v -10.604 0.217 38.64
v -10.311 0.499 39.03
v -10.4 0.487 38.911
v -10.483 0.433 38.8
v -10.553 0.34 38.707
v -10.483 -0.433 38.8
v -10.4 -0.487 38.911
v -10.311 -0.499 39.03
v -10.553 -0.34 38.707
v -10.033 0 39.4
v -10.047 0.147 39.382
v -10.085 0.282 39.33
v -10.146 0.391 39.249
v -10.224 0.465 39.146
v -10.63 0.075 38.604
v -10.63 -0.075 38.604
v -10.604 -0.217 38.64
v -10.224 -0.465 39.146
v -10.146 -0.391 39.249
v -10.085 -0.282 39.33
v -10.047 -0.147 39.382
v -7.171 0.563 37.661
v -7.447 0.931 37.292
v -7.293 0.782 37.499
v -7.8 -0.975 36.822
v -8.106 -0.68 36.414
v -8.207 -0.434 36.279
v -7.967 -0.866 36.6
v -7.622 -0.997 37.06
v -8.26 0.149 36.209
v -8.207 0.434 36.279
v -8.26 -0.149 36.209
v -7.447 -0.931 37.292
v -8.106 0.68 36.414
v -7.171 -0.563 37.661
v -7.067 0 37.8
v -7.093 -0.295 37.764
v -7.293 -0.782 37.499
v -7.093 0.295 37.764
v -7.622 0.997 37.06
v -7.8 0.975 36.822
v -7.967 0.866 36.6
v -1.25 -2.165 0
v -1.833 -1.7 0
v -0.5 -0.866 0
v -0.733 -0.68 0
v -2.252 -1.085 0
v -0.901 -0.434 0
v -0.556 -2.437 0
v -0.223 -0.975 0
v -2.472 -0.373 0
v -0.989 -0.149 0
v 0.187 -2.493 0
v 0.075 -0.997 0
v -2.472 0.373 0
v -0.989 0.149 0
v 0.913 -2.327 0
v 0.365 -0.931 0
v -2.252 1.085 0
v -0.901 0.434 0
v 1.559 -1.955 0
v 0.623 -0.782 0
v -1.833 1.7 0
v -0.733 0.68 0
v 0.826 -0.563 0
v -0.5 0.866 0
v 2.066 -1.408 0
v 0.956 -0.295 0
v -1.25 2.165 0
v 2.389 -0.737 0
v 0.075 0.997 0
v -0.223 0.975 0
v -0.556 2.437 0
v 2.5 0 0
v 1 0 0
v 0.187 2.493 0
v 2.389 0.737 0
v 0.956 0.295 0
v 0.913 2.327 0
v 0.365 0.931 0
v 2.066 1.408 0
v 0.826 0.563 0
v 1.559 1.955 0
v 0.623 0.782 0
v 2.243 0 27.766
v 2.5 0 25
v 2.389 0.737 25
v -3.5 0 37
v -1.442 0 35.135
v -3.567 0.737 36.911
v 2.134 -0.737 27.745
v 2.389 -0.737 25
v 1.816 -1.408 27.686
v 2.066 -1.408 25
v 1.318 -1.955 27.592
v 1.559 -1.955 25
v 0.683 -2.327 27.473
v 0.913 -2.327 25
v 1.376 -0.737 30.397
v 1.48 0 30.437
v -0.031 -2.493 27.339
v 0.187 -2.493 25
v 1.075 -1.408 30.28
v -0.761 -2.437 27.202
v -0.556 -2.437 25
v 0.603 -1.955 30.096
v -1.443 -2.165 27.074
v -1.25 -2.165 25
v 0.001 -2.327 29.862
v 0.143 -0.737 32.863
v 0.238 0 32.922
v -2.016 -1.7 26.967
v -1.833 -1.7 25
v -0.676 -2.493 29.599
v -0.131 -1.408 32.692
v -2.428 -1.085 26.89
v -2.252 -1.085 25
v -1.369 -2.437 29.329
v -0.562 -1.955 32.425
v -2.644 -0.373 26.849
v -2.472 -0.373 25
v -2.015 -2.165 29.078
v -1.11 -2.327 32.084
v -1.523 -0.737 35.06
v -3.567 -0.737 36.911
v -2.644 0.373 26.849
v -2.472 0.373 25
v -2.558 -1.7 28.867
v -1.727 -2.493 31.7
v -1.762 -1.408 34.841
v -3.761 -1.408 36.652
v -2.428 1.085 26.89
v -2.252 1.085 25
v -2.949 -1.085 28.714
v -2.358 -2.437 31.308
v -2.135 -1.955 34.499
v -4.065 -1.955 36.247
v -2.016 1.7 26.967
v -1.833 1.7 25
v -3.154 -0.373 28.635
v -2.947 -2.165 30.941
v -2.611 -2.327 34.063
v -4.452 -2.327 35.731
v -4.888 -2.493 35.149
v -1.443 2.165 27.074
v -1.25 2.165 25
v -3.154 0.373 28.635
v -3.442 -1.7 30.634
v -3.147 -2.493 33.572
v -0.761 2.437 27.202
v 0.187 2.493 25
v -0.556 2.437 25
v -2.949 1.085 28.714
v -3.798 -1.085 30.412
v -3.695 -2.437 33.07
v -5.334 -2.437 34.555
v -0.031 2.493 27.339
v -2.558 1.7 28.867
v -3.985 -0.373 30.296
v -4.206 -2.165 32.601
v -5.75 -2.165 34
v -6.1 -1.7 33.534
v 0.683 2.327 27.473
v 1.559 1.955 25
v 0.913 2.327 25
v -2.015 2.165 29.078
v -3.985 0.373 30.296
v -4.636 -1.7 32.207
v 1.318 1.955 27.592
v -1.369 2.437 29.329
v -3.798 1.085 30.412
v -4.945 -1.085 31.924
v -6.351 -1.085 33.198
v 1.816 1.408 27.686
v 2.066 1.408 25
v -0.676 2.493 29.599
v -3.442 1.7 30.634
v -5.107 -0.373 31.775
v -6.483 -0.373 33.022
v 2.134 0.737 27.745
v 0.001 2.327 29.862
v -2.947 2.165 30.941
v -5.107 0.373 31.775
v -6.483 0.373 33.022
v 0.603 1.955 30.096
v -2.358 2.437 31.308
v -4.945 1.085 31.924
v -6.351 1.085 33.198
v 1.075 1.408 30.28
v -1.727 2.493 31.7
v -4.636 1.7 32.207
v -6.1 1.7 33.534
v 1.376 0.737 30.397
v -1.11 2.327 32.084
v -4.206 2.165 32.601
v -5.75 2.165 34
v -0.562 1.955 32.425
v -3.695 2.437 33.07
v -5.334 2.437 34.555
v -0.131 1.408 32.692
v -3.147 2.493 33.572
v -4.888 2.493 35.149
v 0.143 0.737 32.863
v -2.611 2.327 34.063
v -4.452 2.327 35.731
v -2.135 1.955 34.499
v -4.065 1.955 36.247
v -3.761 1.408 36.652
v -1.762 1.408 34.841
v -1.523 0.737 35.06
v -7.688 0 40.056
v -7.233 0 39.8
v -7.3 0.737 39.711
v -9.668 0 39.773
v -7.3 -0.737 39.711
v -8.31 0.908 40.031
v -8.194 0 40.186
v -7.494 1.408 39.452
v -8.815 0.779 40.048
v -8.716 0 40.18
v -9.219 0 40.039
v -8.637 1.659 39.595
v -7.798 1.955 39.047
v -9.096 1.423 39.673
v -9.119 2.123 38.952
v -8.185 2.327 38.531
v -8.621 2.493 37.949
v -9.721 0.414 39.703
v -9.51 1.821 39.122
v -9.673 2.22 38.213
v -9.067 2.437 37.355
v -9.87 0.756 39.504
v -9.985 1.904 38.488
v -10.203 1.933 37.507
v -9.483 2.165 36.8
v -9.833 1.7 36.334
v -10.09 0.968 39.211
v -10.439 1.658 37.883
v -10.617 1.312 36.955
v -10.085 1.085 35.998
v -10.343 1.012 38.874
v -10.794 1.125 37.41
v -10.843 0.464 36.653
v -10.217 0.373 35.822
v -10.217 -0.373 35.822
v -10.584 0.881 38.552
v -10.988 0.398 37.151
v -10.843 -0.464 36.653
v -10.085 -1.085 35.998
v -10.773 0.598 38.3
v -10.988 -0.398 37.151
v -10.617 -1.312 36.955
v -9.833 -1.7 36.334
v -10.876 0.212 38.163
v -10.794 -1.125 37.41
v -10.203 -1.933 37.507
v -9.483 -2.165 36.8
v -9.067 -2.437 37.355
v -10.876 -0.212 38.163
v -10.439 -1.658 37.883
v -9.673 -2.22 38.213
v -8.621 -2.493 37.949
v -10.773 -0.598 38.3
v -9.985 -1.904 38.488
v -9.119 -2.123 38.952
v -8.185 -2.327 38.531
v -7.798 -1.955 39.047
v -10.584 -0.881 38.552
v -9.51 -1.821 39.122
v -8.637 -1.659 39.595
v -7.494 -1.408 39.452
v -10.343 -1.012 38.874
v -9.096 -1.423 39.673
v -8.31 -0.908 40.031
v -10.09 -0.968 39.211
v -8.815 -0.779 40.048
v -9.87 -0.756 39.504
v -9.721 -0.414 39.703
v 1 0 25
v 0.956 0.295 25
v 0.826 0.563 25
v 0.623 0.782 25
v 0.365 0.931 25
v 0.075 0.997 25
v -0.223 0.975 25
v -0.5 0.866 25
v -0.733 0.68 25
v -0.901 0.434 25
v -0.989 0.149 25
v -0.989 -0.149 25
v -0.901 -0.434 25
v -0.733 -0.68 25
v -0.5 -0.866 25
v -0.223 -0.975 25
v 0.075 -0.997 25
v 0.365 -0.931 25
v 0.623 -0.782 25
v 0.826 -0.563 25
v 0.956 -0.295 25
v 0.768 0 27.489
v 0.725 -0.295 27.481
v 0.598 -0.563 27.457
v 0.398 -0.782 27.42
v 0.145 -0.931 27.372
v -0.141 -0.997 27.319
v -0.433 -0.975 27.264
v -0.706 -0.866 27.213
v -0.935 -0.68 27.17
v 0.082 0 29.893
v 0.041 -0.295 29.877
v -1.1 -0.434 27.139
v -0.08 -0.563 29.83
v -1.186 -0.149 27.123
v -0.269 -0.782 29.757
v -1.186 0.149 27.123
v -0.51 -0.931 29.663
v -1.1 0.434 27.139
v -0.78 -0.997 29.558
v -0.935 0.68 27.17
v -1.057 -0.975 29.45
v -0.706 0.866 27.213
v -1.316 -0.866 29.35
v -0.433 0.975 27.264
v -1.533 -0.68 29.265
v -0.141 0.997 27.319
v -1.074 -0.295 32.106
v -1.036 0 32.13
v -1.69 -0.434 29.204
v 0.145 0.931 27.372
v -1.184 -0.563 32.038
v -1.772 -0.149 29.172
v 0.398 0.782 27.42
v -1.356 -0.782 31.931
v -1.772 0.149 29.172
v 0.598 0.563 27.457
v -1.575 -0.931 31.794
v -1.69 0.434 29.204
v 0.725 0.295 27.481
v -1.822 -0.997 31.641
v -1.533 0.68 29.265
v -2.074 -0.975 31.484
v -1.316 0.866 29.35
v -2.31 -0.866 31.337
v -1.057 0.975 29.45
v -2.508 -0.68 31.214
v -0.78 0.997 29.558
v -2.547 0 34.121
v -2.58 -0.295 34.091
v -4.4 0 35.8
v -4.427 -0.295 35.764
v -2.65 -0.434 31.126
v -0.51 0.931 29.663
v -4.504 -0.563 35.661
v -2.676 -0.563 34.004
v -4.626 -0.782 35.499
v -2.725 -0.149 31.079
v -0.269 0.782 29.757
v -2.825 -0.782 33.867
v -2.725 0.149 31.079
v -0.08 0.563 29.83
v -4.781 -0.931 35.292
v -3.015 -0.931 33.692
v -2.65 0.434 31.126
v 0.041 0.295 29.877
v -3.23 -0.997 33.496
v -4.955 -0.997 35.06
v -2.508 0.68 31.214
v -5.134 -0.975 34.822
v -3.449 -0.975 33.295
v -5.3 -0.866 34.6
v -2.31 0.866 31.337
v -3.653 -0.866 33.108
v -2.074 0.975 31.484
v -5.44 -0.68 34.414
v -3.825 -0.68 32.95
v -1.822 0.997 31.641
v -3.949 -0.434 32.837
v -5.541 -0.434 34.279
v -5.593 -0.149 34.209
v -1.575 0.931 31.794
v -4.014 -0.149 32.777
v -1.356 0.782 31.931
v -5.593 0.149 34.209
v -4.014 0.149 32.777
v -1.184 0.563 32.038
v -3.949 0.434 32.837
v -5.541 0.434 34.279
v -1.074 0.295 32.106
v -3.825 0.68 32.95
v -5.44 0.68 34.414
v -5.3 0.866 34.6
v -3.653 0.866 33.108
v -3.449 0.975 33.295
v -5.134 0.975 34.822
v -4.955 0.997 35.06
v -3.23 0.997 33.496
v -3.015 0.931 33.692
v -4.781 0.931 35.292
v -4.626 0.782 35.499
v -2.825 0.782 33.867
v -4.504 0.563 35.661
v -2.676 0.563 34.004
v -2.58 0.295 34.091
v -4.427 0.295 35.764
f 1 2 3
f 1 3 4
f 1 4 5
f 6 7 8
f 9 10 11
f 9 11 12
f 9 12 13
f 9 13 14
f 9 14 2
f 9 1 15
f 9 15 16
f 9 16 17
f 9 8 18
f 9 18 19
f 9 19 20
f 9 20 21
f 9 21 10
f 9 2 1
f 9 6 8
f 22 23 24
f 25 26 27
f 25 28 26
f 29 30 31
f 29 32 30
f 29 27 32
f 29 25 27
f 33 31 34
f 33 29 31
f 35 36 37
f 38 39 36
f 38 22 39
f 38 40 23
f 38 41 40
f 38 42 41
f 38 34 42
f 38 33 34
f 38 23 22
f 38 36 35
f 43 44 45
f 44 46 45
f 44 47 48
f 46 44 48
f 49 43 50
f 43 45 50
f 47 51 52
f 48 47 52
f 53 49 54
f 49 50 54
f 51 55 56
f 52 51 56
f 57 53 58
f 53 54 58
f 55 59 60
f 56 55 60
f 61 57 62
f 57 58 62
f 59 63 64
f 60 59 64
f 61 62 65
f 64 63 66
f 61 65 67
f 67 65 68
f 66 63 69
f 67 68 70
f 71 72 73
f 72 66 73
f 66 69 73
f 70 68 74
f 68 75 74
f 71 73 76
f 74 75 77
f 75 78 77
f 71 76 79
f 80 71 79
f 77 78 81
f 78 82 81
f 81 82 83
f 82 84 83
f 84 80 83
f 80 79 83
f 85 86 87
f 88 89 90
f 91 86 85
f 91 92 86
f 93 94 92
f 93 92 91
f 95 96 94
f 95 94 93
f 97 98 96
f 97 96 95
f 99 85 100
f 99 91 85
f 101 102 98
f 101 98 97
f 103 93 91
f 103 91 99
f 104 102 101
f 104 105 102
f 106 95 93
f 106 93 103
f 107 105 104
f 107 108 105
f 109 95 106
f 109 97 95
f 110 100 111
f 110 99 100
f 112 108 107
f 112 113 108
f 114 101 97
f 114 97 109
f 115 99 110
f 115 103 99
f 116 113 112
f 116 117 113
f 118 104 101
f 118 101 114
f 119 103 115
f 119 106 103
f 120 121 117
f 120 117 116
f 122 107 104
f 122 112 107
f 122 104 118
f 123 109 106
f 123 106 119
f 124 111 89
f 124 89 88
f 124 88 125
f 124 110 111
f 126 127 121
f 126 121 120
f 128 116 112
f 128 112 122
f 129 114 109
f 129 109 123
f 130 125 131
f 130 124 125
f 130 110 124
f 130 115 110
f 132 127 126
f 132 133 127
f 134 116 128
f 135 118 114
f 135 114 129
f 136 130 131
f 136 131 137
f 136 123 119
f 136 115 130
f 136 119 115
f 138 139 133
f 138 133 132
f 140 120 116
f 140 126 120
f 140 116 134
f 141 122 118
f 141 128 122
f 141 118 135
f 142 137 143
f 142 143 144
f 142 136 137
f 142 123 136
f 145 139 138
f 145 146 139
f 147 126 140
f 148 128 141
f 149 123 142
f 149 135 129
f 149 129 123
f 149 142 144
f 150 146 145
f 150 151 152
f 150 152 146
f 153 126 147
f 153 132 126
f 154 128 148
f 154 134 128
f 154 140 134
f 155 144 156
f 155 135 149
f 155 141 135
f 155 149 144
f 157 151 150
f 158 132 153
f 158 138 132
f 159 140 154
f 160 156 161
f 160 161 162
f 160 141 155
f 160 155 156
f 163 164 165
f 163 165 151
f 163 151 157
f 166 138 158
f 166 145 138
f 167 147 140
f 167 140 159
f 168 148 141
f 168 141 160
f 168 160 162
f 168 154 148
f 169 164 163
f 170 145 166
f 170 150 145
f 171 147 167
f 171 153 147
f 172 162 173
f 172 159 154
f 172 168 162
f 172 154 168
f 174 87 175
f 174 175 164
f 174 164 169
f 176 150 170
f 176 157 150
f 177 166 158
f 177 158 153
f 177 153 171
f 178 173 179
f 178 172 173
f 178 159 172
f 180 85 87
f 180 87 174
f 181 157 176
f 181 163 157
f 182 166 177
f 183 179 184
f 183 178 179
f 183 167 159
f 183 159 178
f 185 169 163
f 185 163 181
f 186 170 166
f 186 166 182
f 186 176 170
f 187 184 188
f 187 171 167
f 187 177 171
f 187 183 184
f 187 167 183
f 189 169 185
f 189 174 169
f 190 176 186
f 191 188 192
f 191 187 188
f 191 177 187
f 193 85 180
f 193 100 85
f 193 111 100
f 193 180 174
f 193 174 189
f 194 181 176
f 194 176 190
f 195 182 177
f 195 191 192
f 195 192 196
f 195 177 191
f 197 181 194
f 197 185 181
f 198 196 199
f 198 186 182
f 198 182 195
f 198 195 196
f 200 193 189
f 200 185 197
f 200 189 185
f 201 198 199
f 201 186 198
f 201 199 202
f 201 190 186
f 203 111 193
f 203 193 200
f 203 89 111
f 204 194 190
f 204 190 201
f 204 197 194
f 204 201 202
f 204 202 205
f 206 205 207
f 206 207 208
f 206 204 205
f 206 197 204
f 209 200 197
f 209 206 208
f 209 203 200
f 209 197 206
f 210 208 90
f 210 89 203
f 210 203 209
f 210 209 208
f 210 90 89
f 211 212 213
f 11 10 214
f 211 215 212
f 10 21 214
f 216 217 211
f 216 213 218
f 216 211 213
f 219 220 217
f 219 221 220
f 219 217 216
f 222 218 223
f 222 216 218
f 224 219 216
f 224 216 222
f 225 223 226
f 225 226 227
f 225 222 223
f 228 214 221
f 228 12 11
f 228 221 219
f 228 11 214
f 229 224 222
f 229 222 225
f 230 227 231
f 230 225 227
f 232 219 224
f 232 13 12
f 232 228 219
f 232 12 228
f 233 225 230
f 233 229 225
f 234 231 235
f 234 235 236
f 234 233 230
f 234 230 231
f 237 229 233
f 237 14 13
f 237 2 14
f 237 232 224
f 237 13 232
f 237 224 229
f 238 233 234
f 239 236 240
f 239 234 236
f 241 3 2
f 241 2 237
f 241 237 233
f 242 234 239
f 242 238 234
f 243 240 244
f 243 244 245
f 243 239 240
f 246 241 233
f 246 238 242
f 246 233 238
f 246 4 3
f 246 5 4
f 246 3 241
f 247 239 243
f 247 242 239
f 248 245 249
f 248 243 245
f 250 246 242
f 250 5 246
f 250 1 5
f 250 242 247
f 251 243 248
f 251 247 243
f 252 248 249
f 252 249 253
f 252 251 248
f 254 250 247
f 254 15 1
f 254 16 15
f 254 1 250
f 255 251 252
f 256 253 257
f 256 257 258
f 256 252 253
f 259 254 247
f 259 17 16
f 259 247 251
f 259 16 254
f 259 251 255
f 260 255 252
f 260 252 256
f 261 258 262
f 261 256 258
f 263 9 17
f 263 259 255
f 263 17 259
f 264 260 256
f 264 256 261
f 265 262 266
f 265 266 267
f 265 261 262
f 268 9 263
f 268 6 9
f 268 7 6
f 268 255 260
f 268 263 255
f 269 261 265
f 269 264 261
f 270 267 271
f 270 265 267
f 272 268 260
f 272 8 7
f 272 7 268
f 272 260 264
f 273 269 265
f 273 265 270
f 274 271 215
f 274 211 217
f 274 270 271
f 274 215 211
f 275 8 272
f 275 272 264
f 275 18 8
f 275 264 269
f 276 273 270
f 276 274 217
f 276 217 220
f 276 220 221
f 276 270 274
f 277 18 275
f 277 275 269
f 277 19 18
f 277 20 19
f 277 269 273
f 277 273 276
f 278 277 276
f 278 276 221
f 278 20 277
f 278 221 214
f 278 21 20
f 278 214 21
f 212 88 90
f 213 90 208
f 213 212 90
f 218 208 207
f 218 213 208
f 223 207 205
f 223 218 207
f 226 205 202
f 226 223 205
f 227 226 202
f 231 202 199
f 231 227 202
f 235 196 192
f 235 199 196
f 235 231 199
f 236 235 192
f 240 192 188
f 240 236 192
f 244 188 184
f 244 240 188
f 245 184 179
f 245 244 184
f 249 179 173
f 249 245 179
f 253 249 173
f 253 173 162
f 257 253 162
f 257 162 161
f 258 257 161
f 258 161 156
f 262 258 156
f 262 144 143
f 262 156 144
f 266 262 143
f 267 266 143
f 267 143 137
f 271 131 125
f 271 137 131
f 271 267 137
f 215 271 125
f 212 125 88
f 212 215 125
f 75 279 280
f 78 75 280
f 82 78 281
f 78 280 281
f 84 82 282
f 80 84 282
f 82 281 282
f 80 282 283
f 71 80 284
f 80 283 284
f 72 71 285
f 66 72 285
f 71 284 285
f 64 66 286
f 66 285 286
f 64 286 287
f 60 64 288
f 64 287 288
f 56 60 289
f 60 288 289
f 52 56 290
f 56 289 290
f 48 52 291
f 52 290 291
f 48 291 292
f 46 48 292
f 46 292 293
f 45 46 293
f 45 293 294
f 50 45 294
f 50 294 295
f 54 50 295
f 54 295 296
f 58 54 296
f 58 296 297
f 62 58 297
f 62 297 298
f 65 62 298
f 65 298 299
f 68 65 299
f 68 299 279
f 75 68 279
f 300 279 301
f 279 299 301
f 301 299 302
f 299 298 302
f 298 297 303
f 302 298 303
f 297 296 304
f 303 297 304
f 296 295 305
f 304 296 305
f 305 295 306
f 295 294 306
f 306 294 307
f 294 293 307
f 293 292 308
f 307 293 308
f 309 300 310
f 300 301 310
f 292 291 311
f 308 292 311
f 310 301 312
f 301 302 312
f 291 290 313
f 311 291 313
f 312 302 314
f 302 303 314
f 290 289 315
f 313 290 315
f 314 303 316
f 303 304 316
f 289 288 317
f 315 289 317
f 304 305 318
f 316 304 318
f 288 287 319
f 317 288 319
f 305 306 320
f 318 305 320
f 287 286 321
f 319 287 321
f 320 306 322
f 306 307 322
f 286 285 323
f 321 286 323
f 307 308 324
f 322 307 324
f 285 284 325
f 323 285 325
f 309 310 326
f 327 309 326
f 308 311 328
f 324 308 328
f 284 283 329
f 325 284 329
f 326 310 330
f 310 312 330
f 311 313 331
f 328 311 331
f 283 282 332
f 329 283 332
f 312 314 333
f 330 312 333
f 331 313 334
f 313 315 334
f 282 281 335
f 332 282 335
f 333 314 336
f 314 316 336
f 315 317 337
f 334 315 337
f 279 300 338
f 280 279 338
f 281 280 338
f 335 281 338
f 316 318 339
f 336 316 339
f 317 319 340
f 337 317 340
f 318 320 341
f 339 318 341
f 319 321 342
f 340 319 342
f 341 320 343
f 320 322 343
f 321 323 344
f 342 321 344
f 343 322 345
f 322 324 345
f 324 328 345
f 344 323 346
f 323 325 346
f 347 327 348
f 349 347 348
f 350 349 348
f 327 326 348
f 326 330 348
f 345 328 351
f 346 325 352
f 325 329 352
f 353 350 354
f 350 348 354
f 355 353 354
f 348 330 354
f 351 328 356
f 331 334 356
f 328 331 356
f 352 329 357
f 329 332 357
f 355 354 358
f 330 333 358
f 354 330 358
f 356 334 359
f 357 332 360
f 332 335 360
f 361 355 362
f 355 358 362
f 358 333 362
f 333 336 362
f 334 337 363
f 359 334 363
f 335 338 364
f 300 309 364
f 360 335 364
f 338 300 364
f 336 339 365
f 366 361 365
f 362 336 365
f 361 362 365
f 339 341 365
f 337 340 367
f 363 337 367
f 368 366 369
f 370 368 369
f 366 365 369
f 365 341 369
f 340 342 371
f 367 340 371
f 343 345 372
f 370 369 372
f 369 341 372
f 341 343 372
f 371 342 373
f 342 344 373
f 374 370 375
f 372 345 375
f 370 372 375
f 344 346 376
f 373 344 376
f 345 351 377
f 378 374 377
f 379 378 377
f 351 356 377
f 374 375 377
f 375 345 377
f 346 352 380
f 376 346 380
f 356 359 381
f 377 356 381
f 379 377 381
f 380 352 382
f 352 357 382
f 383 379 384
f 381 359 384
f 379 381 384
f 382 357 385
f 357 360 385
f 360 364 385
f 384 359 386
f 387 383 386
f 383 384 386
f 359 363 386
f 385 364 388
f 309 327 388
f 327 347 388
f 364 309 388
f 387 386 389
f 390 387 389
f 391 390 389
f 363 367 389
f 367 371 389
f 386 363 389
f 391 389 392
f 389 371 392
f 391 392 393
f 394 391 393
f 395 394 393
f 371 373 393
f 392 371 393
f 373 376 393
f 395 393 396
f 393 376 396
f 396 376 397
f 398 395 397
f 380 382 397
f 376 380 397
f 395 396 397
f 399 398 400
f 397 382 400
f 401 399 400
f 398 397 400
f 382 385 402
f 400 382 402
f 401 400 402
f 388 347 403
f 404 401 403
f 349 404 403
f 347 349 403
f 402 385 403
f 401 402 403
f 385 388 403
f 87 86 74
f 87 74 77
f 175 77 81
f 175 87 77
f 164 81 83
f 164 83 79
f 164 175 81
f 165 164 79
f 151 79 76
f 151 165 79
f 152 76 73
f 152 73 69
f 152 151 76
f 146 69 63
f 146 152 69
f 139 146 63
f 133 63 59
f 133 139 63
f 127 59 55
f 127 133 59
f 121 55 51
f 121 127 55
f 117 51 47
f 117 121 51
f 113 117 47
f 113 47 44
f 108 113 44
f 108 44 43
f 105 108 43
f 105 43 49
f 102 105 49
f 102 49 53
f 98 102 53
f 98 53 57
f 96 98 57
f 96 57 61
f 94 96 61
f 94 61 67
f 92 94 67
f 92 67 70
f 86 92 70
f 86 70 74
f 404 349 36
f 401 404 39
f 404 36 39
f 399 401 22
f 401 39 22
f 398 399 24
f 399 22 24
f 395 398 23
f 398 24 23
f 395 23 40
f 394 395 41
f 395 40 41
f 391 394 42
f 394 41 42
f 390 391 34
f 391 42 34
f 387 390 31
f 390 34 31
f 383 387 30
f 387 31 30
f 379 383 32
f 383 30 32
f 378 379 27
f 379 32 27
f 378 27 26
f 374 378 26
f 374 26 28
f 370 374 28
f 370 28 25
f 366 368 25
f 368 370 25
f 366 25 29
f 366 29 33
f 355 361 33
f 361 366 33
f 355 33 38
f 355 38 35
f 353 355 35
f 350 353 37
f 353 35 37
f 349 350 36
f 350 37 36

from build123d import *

# Parameters (mm, degrees)
F1_R = 2.5
F3_R = 2
F5_R = 1


with BuildPart() as f2:
    # F2: sweep along a path in F0
    with BuildLine(Plane.XZ) as f2_path:
        Line((0, 0), (0, 25))
        ThreePointArc((0, 25), (-1.3196601125, 30.5901699437), (-5, 35))
        Line((-5, 35), (-10.3333333333, 39))
    # F1 (on Top) → F2 (sweep)
    with BuildSketch(Plane.XY):
        Circle(F1_R)
    sweep(path=f2_path.line)

    # F3
    f3_edges = [f2.edges().sort_by_distance(p)[0] for p in [
        (-11.833333, 0, 37),
    ]]
    fillet(f3_edges, radius=F3_R)

    # F6: sweep along a path in F4
    with BuildLine(Plane.XZ) as f6_path:
        Line((0, 0), (0, 25))
        ThreePointArc((0, 25), (-1.3196601125, 30.5901699437), (-5, 35))
        Line((-5, 35), (-7.6666666667, 37))
    # F5 (on face) → F6 (sweep, cut)
    with BuildSketch(Plane(origin=(0, 0, 0), x_dir=(1, 0, 0), z_dir=(0, 0, -1))):
        Circle(F5_R)
    sweep(path=f6_path.line, mode=Mode.SUBTRACT)


solid = f2.part
